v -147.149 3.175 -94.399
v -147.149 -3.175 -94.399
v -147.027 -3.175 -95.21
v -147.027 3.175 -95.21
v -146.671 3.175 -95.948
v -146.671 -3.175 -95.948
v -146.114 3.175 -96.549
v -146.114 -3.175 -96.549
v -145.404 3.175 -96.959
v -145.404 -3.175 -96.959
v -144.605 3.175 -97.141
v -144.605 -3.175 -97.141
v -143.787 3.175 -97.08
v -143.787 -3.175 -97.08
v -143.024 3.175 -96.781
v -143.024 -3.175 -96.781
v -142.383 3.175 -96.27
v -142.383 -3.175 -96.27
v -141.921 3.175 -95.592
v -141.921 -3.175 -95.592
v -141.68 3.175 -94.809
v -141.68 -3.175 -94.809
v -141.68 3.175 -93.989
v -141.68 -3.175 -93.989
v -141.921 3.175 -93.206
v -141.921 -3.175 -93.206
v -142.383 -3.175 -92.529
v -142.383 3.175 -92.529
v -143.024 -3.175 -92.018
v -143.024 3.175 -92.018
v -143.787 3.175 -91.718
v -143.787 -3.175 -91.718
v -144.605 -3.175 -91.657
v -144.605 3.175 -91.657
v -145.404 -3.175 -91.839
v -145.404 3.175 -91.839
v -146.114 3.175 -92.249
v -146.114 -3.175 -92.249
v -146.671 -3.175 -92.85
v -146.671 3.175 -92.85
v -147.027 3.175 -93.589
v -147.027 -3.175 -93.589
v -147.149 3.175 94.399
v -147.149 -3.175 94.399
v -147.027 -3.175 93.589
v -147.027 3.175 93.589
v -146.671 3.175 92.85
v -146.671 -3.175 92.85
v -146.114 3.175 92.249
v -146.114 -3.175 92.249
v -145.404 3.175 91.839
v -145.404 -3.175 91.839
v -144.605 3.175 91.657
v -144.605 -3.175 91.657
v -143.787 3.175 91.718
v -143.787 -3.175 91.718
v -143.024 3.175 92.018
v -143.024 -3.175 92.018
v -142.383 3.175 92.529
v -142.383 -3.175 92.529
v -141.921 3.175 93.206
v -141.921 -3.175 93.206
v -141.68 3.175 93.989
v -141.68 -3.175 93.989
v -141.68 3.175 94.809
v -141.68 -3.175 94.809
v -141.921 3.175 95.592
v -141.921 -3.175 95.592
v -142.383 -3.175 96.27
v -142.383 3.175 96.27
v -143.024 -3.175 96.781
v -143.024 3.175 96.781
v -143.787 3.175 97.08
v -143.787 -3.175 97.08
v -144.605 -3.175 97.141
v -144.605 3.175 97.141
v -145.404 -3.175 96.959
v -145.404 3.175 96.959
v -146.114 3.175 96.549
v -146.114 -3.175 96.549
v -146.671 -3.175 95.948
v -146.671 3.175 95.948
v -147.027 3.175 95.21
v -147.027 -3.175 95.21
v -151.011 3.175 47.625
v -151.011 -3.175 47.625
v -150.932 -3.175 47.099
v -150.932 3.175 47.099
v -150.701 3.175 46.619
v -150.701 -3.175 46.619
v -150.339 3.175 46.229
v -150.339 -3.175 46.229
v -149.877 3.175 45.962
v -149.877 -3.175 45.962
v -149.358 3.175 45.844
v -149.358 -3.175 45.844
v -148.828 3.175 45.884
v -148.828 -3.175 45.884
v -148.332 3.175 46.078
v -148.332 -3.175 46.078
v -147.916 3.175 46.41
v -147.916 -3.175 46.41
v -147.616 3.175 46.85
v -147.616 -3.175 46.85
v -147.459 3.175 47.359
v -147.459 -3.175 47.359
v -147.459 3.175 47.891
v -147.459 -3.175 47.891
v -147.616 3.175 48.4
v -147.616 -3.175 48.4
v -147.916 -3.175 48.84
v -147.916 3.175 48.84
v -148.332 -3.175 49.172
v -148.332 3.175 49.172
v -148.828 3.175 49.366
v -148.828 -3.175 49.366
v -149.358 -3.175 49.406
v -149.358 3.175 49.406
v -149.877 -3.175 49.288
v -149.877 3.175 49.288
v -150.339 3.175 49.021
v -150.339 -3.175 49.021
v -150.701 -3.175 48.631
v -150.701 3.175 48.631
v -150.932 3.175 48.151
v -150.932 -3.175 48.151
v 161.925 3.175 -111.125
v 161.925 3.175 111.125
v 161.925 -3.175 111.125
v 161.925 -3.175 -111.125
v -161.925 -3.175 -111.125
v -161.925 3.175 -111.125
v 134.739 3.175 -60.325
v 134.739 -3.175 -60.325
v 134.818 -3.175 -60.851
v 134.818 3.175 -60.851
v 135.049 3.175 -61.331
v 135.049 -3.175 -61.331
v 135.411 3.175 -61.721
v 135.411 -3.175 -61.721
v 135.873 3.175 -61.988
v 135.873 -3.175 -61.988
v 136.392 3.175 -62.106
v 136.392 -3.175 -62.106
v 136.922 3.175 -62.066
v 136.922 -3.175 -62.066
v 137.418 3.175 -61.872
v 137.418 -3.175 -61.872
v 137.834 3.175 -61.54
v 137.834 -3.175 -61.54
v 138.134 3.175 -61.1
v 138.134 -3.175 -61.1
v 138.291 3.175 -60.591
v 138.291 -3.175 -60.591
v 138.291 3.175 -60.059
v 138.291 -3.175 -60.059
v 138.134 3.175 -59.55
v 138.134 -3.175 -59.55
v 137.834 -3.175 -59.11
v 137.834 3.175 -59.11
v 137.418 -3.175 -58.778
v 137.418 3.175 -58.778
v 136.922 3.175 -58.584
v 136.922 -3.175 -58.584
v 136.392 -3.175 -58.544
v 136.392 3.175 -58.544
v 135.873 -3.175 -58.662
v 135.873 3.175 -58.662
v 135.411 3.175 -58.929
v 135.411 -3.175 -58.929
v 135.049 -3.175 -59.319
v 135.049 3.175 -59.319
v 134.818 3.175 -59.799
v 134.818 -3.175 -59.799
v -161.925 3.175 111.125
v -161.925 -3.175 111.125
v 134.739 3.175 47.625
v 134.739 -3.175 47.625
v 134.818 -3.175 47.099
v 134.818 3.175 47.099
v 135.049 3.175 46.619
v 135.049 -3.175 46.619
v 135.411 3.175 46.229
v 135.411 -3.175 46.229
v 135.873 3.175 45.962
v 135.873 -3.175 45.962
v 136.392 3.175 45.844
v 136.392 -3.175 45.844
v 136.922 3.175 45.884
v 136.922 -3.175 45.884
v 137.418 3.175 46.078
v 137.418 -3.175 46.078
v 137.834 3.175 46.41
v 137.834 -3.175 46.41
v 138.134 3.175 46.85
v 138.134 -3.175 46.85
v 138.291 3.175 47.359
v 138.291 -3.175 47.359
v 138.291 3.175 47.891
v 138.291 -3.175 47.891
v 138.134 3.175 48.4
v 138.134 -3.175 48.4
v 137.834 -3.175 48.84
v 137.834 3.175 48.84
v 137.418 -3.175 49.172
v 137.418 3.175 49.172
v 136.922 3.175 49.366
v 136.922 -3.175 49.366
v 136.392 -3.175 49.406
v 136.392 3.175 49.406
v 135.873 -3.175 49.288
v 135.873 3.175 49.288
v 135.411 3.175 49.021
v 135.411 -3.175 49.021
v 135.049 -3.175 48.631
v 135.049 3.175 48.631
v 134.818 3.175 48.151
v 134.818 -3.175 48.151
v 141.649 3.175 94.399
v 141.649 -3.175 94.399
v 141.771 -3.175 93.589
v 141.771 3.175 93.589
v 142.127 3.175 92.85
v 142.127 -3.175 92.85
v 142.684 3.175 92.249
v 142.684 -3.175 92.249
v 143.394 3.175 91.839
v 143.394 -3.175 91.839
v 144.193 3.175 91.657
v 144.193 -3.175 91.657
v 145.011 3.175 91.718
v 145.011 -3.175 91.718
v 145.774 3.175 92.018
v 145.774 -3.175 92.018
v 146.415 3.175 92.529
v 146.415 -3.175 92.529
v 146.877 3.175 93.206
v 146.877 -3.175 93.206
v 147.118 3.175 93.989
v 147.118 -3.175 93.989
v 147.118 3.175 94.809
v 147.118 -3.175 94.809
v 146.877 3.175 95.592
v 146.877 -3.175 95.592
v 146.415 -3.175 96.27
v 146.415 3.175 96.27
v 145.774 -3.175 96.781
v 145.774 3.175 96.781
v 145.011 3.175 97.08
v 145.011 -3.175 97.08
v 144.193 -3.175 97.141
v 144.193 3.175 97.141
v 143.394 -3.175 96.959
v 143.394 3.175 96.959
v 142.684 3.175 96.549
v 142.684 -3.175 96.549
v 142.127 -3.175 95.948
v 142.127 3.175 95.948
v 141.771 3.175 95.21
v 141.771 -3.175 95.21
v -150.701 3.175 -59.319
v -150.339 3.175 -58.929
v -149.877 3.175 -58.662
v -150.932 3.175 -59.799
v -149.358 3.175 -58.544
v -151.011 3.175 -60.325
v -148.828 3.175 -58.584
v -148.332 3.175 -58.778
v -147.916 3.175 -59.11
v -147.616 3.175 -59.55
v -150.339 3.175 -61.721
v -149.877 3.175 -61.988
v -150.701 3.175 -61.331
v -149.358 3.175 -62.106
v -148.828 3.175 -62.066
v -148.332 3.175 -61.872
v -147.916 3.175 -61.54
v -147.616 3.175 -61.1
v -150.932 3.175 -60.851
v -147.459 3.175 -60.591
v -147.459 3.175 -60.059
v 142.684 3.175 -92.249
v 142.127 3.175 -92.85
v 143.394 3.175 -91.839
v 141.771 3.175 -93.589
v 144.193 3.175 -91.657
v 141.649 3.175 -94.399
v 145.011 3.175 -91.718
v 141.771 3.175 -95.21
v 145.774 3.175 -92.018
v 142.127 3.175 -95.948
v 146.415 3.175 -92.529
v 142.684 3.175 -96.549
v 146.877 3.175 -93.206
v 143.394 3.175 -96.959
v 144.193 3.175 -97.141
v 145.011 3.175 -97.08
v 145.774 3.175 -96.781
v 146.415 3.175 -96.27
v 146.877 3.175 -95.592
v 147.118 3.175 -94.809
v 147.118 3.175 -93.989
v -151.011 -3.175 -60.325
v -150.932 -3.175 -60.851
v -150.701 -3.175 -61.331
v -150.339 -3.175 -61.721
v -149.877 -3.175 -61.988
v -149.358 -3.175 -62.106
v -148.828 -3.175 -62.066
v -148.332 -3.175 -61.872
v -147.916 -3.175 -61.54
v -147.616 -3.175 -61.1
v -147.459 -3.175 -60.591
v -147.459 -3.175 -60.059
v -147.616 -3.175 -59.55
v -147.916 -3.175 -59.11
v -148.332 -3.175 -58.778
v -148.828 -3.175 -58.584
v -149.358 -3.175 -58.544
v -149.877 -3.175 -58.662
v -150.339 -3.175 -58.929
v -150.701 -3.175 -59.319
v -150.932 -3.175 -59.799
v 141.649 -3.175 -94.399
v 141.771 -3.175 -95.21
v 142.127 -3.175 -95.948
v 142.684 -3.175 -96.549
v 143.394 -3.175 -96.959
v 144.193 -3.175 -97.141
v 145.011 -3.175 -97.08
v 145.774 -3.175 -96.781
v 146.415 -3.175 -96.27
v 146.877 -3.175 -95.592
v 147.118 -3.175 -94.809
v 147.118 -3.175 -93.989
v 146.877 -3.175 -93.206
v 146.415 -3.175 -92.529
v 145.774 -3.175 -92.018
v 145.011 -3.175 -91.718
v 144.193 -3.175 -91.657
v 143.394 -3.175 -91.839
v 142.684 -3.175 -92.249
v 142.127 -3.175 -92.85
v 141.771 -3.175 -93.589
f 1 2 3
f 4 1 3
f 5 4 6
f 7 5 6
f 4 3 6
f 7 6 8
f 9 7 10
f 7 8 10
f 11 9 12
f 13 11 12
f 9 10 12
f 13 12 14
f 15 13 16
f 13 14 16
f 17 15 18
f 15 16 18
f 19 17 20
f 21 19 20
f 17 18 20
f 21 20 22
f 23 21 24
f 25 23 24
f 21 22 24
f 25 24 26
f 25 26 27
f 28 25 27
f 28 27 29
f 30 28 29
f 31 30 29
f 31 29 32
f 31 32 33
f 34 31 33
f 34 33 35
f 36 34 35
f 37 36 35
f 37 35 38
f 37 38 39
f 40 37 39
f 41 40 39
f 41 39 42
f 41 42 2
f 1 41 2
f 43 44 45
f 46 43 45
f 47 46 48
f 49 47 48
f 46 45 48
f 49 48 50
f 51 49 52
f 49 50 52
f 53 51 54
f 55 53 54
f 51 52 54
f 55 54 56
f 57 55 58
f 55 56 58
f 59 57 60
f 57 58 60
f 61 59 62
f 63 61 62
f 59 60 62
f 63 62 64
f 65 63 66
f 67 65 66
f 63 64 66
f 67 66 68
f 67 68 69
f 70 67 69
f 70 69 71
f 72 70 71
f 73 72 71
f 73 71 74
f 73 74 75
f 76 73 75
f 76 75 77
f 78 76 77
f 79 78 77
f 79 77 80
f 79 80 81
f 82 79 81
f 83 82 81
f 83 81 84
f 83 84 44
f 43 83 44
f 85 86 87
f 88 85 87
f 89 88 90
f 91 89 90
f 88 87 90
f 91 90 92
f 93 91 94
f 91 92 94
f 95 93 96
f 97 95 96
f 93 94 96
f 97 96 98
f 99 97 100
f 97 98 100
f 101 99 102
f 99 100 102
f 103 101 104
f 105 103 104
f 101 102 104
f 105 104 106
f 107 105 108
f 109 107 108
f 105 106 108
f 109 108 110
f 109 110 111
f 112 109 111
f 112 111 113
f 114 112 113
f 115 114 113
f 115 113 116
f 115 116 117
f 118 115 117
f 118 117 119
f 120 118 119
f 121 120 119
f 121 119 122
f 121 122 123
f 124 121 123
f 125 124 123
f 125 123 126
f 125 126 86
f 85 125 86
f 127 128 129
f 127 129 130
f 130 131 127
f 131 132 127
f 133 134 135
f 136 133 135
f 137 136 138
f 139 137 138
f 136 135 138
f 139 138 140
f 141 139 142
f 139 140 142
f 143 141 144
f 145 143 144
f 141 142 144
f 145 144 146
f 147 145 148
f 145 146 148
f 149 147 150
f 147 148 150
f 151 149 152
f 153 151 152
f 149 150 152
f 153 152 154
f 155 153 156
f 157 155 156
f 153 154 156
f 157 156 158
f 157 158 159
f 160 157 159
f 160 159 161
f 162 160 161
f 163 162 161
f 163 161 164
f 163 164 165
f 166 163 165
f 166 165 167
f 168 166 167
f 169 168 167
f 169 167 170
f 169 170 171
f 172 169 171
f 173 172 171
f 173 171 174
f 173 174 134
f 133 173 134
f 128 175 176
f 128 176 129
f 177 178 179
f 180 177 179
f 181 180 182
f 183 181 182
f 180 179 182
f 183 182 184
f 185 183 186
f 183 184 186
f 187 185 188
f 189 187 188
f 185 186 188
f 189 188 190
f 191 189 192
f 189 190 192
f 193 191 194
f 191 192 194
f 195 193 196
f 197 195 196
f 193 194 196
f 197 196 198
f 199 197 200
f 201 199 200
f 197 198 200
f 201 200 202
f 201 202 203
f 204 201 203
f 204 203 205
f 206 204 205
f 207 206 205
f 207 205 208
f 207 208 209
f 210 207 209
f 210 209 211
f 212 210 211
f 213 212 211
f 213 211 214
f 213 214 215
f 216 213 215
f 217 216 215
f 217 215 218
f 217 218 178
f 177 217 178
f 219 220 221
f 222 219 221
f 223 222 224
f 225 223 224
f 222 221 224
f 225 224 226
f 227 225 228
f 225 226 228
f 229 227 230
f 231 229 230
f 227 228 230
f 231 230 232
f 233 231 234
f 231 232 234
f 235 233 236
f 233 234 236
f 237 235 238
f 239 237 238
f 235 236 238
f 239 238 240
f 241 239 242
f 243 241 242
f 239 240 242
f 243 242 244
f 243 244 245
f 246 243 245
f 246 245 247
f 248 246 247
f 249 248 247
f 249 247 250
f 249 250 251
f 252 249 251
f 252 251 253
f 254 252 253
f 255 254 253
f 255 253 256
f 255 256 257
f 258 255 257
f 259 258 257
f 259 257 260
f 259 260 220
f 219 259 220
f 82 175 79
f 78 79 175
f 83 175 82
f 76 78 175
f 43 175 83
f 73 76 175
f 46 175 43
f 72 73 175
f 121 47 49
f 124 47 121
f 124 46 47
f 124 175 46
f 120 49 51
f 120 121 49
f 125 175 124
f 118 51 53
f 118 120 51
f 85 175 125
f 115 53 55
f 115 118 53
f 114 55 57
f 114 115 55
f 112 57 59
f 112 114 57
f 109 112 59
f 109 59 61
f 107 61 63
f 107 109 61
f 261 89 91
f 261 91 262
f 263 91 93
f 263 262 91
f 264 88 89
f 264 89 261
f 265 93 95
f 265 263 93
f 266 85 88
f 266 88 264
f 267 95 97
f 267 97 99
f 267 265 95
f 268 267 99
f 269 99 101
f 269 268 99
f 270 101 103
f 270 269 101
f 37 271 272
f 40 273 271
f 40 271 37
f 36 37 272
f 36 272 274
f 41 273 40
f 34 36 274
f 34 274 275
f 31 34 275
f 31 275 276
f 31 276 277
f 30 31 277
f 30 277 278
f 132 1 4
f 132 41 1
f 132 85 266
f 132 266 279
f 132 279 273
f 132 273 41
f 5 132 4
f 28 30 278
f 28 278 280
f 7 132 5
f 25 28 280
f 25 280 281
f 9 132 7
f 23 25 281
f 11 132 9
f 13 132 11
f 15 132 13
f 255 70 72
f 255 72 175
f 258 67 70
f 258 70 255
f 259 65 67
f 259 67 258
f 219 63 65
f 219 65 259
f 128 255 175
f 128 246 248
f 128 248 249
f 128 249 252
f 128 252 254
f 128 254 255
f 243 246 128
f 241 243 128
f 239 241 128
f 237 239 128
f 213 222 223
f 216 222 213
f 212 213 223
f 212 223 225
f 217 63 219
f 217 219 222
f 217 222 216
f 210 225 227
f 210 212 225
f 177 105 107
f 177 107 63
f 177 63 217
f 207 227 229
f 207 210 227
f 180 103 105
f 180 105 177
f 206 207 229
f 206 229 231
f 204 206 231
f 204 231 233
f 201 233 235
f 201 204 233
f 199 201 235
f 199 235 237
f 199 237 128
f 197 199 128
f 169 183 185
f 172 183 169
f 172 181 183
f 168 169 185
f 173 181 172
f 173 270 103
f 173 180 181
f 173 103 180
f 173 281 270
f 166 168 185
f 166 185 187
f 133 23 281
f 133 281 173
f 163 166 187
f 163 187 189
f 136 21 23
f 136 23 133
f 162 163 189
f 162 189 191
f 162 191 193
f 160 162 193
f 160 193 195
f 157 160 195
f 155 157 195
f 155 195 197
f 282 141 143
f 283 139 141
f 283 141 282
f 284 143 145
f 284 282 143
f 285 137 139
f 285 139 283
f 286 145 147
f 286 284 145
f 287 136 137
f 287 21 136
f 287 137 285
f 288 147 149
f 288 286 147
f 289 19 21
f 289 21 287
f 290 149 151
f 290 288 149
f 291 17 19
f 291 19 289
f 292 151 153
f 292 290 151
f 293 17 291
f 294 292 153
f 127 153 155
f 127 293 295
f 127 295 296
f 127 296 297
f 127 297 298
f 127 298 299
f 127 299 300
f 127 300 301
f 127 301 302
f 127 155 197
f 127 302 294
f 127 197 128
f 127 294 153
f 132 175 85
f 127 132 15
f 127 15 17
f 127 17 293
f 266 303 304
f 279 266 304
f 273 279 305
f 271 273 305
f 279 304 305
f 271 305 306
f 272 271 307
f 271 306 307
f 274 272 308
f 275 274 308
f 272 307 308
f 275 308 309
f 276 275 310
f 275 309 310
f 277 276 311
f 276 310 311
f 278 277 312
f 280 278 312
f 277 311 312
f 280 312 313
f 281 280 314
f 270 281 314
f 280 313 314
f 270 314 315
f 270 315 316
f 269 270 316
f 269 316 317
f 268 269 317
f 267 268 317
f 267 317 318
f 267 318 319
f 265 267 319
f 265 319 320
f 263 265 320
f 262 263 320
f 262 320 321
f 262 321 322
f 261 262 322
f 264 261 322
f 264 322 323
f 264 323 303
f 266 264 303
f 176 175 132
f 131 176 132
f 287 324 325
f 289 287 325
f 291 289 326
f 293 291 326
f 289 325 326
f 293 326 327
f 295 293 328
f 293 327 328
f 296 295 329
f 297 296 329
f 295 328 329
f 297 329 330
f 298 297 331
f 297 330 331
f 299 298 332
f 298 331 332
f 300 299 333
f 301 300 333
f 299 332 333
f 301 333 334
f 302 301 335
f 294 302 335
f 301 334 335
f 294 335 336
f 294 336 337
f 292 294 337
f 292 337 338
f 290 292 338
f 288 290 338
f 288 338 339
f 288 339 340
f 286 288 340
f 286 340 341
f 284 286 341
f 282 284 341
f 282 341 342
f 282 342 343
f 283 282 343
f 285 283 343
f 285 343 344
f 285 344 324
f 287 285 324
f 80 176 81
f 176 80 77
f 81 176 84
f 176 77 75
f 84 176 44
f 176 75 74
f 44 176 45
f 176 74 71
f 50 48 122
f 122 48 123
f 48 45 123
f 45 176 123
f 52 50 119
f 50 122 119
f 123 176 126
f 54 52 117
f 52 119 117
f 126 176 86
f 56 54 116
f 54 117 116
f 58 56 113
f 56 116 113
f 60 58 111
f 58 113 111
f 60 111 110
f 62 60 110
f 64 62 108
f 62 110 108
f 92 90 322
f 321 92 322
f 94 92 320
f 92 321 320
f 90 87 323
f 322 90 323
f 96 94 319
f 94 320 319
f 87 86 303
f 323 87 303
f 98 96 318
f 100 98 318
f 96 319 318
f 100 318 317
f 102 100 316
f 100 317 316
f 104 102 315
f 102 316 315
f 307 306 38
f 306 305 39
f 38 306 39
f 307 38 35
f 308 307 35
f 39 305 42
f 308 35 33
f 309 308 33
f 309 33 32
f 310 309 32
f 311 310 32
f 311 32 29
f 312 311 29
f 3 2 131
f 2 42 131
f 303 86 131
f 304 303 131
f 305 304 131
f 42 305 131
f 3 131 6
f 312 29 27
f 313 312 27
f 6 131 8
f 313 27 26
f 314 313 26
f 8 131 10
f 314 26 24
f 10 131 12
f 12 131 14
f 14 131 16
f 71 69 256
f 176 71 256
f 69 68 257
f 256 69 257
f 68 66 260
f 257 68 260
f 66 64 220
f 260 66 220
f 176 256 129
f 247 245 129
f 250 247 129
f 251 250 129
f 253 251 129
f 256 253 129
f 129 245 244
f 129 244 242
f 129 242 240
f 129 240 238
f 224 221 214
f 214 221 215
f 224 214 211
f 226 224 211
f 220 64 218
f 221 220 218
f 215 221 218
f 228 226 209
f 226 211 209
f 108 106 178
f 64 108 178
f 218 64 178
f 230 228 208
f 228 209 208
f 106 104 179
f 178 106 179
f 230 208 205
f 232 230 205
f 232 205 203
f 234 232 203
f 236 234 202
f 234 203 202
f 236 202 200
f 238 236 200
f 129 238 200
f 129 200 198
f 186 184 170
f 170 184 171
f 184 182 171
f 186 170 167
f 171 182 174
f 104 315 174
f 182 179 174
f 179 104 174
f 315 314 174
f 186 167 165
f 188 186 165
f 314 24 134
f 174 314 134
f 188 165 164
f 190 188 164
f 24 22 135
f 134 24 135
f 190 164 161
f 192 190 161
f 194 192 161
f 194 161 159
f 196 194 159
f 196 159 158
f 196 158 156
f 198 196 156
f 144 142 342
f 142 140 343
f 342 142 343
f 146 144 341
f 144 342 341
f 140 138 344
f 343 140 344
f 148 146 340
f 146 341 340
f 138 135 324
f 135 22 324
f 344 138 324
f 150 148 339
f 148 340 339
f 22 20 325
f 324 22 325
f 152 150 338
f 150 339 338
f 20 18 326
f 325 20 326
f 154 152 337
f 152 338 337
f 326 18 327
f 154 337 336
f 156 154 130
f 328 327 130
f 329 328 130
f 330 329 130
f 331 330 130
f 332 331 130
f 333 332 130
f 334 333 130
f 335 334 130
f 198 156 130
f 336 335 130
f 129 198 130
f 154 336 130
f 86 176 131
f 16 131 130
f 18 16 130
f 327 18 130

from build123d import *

# Parameters (mm, degrees)
SKETCH1_W                       = 323.85
SKETCH1_H                       = 222.25
BOSS_EXTRUDE1_DEPTH             = 3.175
M5_CLEARANCE_HOLE1_D            = 5.5
F_9_64_0_14063_DIAMETER_HOLE1_D = 3.572002


with BuildPart() as part:
    # Sketch1 → Boss-Extrude1 (new, symmetric)
    with BuildSketch(Plane(origin=(0, 0, 0), x_dir=(1, 0, 0), z_dir=(0, 1, 0))):
        Rectangle(SKETCH1_W, SKETCH1_H)
    extrude(amount=BOSS_EXTRUDE1_DEPTH, both=True)

    # M5 Clearance Hole1 (through all)
    with Locations(Plane(origin=(0, 3.175, 0), x_dir=(1, 0, 0), z_dir=(0, 1, 0))):
        with Locations((-144.399, 94.3991), (144.399, 94.3991), (144.399, -94.3991), (-144.399, -94.3991)):
            Hole(M5_CLEARANCE_HOLE1_D / 2)

    # 9/64 (0.14063) Diameter Hole1 (through all)
    with Locations(Plane(origin=(0, 3.175, 0), x_dir=(1, 0, 0), z_dir=(0, 1, 0))):
        with Locations((-149.225, 60.325), (-149.225, -47.625), (136.525, 60.325), (136.525, -47.625)):
            Hole(F_9_64_0_14063_DIAMETER_HOLE1_D / 2)


solid = part.part
